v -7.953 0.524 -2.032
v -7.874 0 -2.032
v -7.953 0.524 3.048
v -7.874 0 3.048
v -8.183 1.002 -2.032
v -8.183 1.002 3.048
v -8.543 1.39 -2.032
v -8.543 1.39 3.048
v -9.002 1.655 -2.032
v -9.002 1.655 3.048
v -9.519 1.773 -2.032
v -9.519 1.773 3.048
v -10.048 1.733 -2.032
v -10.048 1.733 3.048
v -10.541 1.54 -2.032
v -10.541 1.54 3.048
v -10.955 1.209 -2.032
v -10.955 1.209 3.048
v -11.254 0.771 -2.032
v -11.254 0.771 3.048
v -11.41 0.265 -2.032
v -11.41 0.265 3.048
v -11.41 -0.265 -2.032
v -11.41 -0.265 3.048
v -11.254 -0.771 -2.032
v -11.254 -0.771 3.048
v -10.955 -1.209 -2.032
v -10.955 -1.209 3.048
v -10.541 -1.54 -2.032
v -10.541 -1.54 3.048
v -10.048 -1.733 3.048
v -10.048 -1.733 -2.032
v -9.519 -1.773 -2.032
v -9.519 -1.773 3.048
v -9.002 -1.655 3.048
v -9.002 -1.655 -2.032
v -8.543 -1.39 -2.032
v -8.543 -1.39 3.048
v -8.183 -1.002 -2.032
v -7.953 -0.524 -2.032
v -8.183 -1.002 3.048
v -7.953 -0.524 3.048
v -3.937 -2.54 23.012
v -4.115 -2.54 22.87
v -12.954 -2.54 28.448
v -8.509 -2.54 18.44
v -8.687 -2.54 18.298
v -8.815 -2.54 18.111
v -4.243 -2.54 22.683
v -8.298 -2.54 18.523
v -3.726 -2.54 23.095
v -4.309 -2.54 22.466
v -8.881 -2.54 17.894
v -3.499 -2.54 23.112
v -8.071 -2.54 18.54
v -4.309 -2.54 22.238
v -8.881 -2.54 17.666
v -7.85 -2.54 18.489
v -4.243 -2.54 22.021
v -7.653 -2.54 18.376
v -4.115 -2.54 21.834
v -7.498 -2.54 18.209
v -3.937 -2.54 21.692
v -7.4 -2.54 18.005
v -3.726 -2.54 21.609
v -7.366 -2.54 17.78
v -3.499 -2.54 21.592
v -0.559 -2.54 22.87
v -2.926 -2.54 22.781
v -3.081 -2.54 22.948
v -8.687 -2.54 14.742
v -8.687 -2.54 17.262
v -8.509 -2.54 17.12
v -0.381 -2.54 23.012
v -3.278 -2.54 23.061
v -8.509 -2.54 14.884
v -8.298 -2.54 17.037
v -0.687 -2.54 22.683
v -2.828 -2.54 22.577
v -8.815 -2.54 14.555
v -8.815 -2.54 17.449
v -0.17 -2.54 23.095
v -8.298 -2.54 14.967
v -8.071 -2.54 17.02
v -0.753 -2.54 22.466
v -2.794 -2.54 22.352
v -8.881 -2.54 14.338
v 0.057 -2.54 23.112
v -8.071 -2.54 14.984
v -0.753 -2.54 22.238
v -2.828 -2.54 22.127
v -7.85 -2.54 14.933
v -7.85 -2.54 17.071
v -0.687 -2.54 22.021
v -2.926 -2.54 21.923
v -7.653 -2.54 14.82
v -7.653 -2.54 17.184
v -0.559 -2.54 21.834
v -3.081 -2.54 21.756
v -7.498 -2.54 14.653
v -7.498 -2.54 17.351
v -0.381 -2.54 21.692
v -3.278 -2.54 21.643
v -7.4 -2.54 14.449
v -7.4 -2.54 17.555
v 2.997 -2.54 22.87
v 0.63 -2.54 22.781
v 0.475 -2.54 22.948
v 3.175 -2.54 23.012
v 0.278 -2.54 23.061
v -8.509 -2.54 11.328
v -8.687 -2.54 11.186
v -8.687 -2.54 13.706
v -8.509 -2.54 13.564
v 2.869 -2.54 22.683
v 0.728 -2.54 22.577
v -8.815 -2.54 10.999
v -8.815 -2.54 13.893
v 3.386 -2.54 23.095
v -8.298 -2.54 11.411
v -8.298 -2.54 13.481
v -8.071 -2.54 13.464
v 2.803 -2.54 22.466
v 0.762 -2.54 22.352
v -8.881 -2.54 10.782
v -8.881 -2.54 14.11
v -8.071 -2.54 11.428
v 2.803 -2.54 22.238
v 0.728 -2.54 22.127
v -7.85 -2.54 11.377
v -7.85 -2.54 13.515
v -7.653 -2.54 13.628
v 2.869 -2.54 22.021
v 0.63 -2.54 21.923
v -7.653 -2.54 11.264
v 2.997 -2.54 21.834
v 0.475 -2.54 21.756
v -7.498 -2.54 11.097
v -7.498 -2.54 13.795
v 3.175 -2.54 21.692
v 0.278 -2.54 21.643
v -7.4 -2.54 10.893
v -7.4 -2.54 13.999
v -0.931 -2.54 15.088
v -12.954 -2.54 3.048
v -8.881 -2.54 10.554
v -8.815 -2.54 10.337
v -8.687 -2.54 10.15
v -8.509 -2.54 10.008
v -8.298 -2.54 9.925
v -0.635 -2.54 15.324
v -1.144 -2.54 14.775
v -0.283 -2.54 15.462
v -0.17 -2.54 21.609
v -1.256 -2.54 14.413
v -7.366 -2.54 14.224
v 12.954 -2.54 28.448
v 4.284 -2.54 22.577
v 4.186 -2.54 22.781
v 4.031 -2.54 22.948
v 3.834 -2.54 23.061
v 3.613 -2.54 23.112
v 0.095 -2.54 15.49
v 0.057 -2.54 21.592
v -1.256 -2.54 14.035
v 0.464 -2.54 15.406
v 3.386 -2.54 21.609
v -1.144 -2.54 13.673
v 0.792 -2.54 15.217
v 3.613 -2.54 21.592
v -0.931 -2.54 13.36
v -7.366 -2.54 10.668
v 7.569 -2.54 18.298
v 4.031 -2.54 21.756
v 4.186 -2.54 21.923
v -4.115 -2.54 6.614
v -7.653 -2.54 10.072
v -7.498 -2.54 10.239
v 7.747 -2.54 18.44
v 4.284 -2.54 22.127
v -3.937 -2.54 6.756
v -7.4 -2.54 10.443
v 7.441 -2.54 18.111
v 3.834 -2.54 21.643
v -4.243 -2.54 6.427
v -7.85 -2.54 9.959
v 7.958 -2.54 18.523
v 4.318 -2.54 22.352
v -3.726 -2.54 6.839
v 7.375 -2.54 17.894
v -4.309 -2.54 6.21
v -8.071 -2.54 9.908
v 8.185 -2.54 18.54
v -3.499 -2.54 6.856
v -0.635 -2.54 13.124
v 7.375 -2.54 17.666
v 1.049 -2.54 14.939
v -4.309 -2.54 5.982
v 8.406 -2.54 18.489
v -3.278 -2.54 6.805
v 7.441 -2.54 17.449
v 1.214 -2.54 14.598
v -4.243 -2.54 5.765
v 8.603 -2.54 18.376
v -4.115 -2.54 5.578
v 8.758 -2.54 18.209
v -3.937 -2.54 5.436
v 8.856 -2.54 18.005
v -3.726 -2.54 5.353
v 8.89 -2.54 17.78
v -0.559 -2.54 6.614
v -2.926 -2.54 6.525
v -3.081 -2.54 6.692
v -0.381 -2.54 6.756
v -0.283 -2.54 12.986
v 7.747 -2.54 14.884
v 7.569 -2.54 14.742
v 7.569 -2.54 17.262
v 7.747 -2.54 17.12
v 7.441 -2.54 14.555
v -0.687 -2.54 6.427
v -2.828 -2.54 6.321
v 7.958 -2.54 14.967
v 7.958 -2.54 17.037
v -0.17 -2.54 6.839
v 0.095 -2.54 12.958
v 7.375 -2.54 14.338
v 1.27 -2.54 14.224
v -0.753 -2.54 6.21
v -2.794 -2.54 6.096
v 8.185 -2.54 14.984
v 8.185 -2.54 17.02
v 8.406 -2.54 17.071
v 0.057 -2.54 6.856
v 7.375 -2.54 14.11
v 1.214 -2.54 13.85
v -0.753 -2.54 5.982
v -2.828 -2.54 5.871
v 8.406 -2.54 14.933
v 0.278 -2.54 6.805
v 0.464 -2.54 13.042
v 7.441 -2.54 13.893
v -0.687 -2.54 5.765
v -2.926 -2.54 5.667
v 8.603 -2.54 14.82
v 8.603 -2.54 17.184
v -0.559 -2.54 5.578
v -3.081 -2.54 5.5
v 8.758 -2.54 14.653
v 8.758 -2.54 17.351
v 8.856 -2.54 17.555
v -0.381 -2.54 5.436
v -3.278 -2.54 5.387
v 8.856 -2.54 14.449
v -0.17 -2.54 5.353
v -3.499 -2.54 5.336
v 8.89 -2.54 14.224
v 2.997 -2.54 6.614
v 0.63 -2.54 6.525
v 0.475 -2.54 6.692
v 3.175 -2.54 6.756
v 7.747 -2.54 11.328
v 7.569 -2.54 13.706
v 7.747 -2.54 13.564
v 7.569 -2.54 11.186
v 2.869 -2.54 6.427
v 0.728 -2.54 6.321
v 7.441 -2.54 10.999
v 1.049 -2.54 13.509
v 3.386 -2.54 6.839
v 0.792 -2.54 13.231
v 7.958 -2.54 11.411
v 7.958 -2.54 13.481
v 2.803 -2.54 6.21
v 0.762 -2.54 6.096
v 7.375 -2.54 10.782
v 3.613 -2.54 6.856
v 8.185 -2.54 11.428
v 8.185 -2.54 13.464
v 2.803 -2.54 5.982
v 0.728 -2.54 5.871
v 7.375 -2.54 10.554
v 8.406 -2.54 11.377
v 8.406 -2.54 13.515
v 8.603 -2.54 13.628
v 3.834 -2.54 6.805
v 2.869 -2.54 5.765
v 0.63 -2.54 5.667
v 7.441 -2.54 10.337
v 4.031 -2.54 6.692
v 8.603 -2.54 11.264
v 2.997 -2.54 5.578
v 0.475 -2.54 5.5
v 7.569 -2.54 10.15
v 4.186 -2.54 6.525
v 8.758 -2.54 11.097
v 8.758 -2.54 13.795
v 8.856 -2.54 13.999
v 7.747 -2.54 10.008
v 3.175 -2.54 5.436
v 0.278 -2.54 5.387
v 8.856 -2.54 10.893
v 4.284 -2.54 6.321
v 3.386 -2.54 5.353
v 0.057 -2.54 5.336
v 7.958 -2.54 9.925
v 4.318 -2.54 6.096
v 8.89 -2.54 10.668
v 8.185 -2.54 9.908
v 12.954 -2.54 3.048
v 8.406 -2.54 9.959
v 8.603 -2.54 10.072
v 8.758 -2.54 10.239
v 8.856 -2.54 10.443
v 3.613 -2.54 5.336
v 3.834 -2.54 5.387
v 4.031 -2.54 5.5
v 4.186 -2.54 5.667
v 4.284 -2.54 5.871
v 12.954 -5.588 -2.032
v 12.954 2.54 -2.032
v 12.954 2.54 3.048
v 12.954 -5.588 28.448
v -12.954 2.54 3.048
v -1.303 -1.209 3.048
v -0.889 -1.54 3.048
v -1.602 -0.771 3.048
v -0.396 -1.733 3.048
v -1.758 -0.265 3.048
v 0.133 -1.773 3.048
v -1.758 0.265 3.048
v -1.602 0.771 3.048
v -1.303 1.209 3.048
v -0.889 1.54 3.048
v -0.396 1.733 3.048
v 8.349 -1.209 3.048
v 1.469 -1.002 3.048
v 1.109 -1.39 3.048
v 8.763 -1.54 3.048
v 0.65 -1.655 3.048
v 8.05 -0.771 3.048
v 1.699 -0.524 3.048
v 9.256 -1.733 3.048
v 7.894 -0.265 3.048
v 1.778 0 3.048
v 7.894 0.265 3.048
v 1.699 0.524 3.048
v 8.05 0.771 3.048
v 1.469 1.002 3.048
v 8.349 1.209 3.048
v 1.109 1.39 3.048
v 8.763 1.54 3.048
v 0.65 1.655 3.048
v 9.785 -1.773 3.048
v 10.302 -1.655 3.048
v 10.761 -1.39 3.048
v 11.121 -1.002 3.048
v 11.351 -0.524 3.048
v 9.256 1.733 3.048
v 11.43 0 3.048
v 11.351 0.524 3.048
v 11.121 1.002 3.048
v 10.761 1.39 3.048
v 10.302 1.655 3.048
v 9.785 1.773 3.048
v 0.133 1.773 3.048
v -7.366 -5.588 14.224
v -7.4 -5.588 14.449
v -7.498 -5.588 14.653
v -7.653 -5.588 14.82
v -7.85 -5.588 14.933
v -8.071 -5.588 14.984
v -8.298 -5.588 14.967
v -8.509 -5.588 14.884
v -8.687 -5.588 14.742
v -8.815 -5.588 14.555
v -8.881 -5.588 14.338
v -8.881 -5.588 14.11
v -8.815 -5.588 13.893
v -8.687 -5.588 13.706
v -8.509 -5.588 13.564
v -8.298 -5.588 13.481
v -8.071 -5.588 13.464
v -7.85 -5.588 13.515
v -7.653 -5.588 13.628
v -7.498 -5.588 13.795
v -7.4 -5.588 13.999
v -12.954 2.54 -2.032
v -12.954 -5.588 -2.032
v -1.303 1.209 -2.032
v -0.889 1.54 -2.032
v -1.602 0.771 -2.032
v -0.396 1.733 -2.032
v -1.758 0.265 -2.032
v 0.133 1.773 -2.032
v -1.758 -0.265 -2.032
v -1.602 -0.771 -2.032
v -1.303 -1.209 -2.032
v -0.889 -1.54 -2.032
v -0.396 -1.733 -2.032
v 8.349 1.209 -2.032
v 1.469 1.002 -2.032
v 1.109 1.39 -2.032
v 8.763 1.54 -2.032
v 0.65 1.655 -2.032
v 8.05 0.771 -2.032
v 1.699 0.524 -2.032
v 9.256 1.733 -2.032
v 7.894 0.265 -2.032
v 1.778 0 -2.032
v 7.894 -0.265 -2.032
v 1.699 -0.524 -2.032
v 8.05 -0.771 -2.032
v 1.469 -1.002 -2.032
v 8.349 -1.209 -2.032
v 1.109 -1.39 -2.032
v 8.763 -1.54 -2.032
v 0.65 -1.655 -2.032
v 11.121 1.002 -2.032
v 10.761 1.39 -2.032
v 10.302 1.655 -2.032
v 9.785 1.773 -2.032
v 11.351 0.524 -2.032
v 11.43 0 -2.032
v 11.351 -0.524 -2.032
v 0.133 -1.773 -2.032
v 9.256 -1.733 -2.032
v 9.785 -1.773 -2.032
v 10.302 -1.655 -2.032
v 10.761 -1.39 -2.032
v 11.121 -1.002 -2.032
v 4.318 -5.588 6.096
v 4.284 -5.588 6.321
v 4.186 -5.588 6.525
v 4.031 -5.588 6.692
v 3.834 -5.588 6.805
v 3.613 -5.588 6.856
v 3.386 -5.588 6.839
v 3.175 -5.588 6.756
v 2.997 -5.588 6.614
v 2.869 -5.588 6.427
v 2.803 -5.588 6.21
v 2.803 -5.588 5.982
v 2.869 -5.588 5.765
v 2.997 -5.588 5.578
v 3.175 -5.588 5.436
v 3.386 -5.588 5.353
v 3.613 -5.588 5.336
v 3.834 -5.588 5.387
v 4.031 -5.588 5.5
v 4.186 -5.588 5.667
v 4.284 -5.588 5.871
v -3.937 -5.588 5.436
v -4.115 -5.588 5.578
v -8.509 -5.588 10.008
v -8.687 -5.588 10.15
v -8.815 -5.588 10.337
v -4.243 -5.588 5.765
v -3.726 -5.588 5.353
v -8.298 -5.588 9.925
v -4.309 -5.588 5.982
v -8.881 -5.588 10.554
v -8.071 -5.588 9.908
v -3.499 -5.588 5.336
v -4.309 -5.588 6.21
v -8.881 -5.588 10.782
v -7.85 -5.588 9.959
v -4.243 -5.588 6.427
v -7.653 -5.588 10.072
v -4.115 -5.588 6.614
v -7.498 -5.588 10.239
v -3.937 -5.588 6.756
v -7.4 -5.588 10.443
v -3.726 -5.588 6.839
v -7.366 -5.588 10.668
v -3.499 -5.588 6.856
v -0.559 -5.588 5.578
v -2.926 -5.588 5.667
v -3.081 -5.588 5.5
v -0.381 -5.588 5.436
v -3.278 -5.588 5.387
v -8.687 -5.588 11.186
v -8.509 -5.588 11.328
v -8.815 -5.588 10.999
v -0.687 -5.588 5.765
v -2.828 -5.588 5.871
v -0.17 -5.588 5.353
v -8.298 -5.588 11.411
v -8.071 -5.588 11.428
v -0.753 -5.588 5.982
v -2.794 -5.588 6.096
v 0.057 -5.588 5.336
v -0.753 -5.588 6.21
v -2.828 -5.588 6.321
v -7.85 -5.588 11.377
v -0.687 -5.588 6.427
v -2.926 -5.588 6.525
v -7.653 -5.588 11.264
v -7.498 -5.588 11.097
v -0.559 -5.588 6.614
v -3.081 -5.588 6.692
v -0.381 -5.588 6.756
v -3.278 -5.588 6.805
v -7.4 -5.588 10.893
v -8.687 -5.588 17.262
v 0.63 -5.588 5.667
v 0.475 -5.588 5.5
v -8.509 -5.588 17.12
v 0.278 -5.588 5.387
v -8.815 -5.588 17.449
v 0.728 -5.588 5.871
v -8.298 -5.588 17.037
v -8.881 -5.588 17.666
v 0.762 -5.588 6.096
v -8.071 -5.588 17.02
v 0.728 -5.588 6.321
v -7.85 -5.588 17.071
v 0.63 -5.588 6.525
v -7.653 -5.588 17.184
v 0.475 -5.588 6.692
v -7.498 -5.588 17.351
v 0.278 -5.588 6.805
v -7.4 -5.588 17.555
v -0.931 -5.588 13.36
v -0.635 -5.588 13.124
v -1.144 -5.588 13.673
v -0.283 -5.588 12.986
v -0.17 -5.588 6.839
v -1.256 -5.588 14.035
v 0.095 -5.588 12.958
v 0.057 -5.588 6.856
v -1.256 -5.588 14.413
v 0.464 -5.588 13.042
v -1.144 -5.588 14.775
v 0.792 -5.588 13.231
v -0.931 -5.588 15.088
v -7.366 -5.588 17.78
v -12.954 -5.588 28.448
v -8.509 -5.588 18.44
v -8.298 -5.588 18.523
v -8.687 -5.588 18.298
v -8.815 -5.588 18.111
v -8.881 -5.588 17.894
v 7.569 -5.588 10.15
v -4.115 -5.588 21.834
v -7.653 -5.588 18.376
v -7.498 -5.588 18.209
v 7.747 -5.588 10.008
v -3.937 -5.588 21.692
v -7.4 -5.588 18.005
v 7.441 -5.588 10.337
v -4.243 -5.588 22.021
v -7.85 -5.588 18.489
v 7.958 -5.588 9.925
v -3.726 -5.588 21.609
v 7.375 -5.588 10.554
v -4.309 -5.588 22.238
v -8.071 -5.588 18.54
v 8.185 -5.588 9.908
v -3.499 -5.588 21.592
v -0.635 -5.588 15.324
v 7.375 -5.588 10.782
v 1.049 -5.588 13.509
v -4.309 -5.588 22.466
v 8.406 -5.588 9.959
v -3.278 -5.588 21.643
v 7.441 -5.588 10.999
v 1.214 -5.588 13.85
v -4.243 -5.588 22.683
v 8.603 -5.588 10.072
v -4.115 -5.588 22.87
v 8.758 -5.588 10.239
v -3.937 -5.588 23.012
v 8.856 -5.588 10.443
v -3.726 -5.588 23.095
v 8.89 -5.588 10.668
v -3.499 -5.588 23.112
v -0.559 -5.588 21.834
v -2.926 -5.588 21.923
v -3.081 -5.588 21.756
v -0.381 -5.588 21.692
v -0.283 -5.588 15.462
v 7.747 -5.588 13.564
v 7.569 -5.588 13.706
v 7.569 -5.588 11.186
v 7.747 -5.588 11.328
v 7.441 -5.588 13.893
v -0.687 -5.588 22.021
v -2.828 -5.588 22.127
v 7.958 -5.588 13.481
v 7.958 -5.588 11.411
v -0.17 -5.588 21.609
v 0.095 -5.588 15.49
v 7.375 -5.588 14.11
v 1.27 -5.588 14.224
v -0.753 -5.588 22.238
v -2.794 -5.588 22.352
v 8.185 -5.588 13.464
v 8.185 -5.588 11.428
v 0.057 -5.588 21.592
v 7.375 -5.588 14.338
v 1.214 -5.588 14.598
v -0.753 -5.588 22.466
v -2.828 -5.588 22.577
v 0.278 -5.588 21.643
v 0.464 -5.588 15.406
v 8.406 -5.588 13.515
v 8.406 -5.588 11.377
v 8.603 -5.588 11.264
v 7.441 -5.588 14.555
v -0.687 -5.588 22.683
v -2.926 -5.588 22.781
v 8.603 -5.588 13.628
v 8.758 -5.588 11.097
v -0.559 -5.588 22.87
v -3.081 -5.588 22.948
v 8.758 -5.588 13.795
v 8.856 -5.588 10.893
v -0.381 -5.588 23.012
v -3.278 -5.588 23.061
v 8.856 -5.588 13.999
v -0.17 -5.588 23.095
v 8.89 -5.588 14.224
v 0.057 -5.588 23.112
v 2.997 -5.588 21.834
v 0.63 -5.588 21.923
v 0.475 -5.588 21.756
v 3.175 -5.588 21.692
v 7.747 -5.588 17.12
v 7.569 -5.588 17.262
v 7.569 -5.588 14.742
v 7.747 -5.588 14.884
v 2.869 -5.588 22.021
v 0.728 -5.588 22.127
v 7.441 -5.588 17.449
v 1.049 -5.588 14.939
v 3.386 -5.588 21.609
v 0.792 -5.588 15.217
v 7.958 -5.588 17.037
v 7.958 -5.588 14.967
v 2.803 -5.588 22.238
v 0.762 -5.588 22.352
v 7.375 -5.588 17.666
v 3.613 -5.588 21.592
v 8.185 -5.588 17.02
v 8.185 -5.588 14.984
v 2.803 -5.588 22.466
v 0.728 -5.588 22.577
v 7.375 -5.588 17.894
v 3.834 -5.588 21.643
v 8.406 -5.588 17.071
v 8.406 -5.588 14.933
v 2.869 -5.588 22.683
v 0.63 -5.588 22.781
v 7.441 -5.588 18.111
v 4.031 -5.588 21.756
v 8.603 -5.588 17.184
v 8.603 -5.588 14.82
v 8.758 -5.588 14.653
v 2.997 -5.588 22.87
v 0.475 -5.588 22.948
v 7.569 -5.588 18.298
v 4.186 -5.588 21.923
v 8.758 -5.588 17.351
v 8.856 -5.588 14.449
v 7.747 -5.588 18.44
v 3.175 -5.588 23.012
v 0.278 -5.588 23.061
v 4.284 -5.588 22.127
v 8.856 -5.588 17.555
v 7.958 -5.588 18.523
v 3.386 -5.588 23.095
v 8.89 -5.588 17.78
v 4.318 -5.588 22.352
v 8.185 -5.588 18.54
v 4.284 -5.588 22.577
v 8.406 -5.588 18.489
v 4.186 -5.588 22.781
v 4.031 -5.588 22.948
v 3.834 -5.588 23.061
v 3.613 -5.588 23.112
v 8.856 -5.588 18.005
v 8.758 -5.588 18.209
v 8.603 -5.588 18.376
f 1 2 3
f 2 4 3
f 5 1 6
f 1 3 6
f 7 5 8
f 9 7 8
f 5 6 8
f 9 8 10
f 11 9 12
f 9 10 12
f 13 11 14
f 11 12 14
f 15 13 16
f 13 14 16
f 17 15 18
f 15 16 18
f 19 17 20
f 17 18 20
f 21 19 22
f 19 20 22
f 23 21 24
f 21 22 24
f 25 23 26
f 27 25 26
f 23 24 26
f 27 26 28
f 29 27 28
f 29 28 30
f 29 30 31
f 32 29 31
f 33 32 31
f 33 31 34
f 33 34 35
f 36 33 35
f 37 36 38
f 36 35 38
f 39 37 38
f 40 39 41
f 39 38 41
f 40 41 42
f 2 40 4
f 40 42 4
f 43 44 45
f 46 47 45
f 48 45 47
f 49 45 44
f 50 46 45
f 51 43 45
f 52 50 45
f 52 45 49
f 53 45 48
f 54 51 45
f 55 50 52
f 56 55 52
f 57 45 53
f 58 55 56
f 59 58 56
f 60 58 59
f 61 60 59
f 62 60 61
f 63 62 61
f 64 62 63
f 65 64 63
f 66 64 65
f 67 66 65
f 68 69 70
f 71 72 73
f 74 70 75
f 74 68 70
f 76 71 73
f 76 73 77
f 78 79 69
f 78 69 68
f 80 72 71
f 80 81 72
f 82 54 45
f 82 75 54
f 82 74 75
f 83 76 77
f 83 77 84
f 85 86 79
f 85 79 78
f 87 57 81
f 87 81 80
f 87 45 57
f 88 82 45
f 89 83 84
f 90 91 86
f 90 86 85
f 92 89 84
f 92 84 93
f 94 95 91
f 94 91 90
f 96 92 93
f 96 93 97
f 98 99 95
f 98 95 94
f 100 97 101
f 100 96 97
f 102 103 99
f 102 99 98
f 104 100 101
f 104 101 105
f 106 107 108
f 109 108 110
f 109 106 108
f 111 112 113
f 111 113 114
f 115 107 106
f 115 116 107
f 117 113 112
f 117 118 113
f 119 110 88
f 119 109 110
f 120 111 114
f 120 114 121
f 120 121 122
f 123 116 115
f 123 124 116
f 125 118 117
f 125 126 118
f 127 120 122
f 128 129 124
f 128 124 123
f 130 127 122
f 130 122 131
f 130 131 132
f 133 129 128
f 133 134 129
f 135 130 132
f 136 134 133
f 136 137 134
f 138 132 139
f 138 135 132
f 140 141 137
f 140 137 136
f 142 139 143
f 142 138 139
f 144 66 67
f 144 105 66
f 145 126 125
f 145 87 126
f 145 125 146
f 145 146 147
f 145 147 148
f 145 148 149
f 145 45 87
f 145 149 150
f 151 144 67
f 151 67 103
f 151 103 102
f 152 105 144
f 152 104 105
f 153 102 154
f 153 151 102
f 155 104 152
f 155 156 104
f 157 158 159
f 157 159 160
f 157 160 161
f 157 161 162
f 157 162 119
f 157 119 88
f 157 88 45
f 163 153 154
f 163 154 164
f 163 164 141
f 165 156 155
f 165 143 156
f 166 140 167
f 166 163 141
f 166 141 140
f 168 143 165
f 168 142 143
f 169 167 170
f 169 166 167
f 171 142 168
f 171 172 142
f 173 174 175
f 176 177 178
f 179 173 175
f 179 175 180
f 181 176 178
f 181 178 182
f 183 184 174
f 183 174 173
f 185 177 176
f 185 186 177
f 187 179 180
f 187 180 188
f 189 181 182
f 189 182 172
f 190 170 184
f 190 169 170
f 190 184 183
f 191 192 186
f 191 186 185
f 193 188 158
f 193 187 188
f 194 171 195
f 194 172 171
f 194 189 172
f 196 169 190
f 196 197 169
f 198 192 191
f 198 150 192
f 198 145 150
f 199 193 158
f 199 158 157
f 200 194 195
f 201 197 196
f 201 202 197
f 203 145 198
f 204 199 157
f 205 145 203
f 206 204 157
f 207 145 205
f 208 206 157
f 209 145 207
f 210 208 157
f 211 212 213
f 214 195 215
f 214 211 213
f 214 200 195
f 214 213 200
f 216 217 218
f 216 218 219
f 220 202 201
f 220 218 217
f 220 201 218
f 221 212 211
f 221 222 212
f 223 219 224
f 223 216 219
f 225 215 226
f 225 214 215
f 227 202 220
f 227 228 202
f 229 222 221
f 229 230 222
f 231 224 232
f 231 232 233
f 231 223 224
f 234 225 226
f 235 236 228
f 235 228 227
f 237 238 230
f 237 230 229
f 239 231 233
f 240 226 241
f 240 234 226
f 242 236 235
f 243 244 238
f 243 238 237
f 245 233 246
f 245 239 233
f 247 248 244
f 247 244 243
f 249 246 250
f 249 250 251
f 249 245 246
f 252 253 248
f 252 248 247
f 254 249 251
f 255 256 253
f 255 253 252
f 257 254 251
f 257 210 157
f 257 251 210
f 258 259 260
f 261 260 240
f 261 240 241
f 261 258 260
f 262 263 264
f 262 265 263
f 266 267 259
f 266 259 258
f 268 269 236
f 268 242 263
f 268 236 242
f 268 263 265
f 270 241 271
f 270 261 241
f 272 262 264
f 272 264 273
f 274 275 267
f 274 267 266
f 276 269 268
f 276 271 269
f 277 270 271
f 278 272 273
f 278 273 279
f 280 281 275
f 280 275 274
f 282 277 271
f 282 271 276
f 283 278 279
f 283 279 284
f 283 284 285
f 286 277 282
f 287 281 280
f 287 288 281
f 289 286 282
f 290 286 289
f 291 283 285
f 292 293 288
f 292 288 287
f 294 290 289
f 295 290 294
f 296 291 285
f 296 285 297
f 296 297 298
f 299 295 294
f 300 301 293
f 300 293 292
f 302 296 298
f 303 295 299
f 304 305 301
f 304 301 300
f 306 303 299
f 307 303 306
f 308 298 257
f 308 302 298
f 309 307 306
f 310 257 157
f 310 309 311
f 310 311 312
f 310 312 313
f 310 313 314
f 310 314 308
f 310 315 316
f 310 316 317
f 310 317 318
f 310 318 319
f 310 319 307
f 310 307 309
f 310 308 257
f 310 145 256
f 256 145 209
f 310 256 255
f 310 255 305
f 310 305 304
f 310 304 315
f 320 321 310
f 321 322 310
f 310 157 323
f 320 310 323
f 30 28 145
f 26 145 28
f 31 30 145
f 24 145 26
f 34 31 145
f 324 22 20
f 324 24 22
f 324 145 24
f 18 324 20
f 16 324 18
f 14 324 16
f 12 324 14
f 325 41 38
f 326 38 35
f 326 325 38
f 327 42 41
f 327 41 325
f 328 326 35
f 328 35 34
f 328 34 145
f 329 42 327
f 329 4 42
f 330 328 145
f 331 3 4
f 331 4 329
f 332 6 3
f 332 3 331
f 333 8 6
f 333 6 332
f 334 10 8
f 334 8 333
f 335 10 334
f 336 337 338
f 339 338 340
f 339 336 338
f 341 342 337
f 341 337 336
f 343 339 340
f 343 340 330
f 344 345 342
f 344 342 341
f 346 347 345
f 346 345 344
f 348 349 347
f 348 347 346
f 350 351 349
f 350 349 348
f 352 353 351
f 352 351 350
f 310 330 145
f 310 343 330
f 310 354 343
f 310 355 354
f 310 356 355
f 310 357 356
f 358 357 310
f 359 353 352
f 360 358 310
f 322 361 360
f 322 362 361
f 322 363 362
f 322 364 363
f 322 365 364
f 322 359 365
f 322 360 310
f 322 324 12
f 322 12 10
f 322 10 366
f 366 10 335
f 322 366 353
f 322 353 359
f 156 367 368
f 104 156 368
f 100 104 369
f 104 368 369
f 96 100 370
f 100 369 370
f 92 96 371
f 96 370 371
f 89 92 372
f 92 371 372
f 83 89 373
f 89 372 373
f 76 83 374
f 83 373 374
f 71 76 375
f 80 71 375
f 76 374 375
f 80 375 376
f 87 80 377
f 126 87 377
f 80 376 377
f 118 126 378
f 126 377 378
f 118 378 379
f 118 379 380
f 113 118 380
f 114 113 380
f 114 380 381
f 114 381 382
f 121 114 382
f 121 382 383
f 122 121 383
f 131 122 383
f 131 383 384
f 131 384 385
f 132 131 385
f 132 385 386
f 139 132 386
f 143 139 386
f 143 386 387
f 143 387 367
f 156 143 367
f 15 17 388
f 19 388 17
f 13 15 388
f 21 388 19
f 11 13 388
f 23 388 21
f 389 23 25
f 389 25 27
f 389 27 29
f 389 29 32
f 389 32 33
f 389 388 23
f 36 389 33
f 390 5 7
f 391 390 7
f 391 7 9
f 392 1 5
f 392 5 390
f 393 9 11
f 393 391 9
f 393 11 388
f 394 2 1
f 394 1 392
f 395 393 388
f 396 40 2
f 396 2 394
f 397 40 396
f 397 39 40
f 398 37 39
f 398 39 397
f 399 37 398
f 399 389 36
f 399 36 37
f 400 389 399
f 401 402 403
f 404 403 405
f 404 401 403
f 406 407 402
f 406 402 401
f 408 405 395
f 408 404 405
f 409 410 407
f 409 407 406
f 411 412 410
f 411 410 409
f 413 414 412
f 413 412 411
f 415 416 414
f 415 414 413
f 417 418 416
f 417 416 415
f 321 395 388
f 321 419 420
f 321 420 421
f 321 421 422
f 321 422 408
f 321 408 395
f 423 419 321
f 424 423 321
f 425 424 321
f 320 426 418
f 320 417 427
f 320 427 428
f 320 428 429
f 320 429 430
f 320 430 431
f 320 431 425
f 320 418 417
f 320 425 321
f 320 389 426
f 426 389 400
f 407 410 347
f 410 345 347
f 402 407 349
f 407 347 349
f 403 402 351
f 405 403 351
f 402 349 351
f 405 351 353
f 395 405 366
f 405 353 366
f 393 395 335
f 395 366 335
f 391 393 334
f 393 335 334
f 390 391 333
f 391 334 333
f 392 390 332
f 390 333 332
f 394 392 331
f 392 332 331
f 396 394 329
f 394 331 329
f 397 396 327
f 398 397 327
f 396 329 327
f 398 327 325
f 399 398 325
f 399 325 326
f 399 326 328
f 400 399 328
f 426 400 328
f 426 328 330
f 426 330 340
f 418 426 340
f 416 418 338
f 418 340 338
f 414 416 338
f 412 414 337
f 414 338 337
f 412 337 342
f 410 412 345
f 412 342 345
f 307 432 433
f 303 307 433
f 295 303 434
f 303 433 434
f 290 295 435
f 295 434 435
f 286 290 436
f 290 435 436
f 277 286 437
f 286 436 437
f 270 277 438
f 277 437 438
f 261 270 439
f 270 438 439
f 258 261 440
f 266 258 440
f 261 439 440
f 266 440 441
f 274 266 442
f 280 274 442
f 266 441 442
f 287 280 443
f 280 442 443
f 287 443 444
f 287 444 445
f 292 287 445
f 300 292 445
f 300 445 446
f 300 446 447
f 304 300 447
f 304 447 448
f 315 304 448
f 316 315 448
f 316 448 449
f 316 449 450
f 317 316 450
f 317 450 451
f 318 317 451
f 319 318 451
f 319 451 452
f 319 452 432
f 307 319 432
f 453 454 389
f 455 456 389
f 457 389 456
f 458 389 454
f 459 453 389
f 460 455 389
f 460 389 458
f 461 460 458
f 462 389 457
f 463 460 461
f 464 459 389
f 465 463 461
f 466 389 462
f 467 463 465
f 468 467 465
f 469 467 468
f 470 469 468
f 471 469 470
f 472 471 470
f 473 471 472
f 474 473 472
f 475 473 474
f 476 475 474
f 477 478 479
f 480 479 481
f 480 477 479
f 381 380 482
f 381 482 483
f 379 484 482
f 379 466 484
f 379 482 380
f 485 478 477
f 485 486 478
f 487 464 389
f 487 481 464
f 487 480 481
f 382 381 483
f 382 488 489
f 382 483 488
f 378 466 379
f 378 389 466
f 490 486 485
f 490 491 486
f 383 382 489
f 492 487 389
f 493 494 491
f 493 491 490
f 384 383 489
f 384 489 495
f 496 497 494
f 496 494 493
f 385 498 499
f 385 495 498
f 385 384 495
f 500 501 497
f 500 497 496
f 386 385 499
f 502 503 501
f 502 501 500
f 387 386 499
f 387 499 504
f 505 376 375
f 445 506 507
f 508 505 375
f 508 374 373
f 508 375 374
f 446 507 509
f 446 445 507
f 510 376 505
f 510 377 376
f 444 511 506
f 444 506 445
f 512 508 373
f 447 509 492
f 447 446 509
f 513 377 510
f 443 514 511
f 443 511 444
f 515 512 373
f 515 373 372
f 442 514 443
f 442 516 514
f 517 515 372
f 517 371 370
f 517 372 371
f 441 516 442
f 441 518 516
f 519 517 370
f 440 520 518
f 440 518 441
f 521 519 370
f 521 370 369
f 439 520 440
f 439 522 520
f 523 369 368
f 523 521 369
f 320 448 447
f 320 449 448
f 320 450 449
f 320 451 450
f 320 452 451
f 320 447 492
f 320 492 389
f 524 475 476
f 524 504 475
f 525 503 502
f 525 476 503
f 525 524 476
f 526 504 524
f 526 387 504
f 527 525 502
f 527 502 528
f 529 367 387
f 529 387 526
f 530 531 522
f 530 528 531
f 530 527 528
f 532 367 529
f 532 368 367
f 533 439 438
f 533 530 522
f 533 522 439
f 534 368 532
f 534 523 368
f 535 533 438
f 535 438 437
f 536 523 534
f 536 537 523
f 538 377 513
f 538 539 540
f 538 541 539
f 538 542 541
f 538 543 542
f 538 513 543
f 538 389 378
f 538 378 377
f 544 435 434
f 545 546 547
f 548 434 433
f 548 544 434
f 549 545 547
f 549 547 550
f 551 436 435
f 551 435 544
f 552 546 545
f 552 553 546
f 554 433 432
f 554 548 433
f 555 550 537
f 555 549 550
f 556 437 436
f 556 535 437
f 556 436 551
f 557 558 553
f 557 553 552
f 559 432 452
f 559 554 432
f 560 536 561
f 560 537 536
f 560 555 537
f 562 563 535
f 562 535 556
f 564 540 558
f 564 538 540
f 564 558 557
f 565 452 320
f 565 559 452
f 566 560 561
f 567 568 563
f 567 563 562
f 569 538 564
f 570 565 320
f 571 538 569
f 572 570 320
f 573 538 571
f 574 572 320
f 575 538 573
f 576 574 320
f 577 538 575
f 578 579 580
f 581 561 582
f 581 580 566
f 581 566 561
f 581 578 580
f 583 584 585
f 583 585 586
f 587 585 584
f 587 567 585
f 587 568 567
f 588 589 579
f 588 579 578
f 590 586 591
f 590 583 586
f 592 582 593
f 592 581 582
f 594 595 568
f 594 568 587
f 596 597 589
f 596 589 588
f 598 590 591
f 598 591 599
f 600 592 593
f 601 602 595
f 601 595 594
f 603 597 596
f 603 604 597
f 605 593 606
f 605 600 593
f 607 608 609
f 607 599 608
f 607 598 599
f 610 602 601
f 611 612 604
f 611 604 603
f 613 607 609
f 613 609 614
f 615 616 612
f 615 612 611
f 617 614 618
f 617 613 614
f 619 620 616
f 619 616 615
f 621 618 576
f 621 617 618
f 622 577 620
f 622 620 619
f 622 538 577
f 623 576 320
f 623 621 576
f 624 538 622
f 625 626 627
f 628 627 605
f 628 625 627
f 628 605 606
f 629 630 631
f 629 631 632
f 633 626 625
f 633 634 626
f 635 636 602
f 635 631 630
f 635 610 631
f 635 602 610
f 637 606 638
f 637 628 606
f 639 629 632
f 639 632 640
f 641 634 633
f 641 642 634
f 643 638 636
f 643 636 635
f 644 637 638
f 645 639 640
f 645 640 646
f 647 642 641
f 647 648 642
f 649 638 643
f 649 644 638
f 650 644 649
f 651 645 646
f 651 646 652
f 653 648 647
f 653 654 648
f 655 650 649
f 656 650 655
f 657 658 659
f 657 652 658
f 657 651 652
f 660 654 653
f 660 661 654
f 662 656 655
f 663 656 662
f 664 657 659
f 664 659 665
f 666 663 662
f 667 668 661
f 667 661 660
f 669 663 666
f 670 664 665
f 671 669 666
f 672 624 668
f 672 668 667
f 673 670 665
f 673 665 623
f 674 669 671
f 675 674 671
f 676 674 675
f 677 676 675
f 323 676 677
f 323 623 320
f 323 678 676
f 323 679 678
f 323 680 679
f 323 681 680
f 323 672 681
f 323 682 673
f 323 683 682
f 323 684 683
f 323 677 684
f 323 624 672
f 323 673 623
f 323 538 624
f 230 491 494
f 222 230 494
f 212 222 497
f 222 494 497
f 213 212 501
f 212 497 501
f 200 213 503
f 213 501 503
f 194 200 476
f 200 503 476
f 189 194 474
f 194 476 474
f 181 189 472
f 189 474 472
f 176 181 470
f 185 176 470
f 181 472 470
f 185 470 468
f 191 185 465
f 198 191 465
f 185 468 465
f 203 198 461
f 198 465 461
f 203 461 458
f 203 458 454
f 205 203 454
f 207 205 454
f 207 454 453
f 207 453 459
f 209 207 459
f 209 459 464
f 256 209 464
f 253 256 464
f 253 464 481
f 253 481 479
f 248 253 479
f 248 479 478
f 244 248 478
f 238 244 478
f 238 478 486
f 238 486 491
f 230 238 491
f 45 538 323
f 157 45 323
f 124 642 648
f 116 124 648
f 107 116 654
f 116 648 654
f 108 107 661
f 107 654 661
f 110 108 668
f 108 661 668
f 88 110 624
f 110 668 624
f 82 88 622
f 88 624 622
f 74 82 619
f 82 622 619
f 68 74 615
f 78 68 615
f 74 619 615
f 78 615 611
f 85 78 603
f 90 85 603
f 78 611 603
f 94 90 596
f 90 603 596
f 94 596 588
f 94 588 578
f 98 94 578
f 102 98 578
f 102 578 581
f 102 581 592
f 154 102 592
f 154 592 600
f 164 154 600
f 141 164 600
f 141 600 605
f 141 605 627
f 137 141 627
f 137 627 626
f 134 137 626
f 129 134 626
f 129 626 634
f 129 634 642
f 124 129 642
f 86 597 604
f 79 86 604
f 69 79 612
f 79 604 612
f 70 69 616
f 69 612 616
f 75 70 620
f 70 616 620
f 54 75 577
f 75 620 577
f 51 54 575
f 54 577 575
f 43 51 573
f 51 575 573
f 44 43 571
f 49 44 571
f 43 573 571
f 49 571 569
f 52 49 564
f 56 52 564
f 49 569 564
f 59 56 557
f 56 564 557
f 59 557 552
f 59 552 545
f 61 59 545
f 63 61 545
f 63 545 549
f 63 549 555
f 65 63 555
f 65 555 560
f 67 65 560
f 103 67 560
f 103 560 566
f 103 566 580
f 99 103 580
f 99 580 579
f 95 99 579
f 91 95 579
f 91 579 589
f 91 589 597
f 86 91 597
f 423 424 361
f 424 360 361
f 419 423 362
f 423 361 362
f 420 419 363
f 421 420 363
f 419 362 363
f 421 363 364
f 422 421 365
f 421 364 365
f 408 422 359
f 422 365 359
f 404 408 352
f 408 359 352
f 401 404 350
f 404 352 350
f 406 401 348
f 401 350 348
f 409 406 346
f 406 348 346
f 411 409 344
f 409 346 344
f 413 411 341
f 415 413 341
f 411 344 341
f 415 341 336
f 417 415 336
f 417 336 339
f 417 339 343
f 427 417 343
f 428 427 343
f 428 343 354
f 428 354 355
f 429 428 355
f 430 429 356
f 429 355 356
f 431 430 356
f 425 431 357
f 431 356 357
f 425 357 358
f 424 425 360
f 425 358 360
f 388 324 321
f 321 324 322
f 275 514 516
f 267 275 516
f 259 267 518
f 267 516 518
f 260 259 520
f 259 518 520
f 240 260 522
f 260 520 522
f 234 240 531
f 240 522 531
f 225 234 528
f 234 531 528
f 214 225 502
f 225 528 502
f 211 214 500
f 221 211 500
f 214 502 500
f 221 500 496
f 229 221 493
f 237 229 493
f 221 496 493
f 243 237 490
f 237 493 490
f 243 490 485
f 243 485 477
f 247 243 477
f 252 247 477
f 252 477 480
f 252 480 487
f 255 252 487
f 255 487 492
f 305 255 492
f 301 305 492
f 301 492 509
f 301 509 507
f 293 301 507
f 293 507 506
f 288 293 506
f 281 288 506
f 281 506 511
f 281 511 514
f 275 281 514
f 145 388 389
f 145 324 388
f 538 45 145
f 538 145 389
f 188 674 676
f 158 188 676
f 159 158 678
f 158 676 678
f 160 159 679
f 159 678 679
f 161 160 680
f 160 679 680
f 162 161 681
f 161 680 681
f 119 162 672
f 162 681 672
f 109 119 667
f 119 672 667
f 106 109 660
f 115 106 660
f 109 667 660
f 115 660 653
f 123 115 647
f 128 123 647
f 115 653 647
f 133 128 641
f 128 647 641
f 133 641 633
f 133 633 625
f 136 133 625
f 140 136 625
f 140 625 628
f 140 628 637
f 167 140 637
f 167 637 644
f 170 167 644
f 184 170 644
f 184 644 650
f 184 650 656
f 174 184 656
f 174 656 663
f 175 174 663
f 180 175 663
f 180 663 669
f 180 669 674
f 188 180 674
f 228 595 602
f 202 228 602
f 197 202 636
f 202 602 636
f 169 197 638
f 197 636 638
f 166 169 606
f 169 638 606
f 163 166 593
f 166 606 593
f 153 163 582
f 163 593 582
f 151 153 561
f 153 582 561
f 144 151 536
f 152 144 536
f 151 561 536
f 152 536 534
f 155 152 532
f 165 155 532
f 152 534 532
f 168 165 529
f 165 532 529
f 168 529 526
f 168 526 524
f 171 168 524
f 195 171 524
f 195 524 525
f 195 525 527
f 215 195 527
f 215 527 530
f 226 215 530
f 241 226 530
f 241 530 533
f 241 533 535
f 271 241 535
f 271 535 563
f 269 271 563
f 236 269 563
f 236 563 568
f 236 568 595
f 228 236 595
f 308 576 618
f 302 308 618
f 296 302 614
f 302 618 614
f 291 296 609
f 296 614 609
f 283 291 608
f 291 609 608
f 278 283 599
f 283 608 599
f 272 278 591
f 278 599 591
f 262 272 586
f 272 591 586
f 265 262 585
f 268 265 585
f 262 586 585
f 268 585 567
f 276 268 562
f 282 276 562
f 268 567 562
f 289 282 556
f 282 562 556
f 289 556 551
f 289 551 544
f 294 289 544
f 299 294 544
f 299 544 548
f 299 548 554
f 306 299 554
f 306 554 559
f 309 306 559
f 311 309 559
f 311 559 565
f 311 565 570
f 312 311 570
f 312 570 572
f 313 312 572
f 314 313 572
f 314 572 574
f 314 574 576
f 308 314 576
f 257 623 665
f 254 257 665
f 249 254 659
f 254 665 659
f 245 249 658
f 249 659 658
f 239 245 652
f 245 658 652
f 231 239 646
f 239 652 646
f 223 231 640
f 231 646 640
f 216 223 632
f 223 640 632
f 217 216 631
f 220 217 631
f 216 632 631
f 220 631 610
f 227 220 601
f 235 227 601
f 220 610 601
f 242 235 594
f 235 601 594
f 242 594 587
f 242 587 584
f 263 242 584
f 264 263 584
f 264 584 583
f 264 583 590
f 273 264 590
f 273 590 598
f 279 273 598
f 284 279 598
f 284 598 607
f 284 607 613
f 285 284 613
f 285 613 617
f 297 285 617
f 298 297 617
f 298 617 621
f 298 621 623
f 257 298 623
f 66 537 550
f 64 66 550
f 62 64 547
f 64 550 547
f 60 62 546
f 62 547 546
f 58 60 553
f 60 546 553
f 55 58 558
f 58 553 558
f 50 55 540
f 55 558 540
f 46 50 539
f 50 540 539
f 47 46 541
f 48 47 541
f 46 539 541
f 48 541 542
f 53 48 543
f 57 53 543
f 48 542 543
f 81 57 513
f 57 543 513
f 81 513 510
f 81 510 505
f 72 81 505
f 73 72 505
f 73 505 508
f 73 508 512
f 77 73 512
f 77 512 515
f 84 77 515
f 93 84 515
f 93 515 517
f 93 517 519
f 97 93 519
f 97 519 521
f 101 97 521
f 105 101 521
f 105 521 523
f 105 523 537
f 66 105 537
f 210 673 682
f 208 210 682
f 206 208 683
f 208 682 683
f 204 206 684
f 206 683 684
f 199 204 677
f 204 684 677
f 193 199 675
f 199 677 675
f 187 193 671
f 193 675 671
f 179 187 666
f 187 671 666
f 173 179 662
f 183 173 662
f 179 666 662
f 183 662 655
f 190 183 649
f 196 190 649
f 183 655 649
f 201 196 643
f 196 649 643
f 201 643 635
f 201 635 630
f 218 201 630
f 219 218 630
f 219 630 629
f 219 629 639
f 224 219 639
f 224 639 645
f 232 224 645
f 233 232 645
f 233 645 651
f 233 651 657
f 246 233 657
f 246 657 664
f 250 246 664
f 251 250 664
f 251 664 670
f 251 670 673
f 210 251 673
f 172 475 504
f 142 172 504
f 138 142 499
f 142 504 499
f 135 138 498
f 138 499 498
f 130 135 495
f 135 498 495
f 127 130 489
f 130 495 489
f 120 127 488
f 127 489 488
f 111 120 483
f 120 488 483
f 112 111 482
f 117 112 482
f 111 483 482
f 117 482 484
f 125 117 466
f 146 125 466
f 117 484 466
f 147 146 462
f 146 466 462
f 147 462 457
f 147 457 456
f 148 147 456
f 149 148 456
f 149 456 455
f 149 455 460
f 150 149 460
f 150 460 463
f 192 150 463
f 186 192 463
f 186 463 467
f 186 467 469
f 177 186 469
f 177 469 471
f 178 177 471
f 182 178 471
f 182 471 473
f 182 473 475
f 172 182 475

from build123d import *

# Parameters (mm, degrees)
F0_W     = 25.908
F0_H     = 5.08
F1_DEPTH = 3.048
F2_W     = 25.908
F2_H     = 3.048
F3_DEPTH = 28.448
F4_R     = 0.762
F4_R_2   = 1.27
F5_DEPTH = 25.4
F6_R     = 1.778
F7_DEPTH = 25.4
F8_DEPTH = 2.032


with BuildPart() as f1:
    # F0 (on Top) → F1 (new body)
    with BuildSketch(Plane.XY):
        Rectangle(F0_W, F0_H)
    extrude(amount=F1_DEPTH)

    # F2 (on face) → F3 (join)
    with BuildSketch(Plane(origin=(0, 0, 0), x_dir=(1, 0, 0), z_dir=(0, 0, -1))):
        with Locations((0, 4.064)):
            Rectangle(F2_W, F2_H)
    extrude(amount=-F3_DEPTH)

    # F4 (on face) → F5 (cut)
    with BuildSketch(Plane.XZ.offset(5.588)):
        with Locations((-8.128, 14.224)):
            Circle(F4_R)
        with Locations((-8.128, 17.78)):
            Circle(F4_R)
        with Locations((-8.128, 10.668)):
            Circle(F4_R)
        with Locations((-3.556, 6.096)):
            Circle(F4_R)
        with Locations((0, 6.096)):
            Circle(F4_R)
        with Locations((3.556, 6.096)):
            Circle(F4_R)
        with Locations((8.128, 10.668)):
            Circle(F4_R)
        with Locations((8.128, 14.224)):
            Circle(F4_R)
        with Locations((8.128, 17.78)):
            Circle(F4_R)
        with Locations((3.556, 22.352)):
            Circle(F4_R)
        with Locations((0, 22.352)):
            Circle(F4_R)
        with Locations((-3.556, 22.352)):
            Circle(F4_R)
        with Locations((0, 14.224)):
            Circle(F4_R_2)
    extrude(amount=-F5_DEPTH, mode=Mode.SUBTRACT)

    # F6 (on face) → F7 (cut)
    with BuildSketch(Plane.XY.offset(3.048)):
        with Locations((-9.652, 0)):
            Circle(F6_R)
        Circle(F6_R)
        with Locations((9.652, 0)):
            Circle(F6_R)
    extrude(amount=-F7_DEPTH, mode=Mode.SUBTRACT)

    # F8 (add): a face of the model
    f8_faces = [f1.faces().sort_by_distance(p)[0] for p in [
        (0, 2.2684693667, 0),
    ]]
    extrude(f8_faces, amount=F8_DEPTH)


solid = f1.part
